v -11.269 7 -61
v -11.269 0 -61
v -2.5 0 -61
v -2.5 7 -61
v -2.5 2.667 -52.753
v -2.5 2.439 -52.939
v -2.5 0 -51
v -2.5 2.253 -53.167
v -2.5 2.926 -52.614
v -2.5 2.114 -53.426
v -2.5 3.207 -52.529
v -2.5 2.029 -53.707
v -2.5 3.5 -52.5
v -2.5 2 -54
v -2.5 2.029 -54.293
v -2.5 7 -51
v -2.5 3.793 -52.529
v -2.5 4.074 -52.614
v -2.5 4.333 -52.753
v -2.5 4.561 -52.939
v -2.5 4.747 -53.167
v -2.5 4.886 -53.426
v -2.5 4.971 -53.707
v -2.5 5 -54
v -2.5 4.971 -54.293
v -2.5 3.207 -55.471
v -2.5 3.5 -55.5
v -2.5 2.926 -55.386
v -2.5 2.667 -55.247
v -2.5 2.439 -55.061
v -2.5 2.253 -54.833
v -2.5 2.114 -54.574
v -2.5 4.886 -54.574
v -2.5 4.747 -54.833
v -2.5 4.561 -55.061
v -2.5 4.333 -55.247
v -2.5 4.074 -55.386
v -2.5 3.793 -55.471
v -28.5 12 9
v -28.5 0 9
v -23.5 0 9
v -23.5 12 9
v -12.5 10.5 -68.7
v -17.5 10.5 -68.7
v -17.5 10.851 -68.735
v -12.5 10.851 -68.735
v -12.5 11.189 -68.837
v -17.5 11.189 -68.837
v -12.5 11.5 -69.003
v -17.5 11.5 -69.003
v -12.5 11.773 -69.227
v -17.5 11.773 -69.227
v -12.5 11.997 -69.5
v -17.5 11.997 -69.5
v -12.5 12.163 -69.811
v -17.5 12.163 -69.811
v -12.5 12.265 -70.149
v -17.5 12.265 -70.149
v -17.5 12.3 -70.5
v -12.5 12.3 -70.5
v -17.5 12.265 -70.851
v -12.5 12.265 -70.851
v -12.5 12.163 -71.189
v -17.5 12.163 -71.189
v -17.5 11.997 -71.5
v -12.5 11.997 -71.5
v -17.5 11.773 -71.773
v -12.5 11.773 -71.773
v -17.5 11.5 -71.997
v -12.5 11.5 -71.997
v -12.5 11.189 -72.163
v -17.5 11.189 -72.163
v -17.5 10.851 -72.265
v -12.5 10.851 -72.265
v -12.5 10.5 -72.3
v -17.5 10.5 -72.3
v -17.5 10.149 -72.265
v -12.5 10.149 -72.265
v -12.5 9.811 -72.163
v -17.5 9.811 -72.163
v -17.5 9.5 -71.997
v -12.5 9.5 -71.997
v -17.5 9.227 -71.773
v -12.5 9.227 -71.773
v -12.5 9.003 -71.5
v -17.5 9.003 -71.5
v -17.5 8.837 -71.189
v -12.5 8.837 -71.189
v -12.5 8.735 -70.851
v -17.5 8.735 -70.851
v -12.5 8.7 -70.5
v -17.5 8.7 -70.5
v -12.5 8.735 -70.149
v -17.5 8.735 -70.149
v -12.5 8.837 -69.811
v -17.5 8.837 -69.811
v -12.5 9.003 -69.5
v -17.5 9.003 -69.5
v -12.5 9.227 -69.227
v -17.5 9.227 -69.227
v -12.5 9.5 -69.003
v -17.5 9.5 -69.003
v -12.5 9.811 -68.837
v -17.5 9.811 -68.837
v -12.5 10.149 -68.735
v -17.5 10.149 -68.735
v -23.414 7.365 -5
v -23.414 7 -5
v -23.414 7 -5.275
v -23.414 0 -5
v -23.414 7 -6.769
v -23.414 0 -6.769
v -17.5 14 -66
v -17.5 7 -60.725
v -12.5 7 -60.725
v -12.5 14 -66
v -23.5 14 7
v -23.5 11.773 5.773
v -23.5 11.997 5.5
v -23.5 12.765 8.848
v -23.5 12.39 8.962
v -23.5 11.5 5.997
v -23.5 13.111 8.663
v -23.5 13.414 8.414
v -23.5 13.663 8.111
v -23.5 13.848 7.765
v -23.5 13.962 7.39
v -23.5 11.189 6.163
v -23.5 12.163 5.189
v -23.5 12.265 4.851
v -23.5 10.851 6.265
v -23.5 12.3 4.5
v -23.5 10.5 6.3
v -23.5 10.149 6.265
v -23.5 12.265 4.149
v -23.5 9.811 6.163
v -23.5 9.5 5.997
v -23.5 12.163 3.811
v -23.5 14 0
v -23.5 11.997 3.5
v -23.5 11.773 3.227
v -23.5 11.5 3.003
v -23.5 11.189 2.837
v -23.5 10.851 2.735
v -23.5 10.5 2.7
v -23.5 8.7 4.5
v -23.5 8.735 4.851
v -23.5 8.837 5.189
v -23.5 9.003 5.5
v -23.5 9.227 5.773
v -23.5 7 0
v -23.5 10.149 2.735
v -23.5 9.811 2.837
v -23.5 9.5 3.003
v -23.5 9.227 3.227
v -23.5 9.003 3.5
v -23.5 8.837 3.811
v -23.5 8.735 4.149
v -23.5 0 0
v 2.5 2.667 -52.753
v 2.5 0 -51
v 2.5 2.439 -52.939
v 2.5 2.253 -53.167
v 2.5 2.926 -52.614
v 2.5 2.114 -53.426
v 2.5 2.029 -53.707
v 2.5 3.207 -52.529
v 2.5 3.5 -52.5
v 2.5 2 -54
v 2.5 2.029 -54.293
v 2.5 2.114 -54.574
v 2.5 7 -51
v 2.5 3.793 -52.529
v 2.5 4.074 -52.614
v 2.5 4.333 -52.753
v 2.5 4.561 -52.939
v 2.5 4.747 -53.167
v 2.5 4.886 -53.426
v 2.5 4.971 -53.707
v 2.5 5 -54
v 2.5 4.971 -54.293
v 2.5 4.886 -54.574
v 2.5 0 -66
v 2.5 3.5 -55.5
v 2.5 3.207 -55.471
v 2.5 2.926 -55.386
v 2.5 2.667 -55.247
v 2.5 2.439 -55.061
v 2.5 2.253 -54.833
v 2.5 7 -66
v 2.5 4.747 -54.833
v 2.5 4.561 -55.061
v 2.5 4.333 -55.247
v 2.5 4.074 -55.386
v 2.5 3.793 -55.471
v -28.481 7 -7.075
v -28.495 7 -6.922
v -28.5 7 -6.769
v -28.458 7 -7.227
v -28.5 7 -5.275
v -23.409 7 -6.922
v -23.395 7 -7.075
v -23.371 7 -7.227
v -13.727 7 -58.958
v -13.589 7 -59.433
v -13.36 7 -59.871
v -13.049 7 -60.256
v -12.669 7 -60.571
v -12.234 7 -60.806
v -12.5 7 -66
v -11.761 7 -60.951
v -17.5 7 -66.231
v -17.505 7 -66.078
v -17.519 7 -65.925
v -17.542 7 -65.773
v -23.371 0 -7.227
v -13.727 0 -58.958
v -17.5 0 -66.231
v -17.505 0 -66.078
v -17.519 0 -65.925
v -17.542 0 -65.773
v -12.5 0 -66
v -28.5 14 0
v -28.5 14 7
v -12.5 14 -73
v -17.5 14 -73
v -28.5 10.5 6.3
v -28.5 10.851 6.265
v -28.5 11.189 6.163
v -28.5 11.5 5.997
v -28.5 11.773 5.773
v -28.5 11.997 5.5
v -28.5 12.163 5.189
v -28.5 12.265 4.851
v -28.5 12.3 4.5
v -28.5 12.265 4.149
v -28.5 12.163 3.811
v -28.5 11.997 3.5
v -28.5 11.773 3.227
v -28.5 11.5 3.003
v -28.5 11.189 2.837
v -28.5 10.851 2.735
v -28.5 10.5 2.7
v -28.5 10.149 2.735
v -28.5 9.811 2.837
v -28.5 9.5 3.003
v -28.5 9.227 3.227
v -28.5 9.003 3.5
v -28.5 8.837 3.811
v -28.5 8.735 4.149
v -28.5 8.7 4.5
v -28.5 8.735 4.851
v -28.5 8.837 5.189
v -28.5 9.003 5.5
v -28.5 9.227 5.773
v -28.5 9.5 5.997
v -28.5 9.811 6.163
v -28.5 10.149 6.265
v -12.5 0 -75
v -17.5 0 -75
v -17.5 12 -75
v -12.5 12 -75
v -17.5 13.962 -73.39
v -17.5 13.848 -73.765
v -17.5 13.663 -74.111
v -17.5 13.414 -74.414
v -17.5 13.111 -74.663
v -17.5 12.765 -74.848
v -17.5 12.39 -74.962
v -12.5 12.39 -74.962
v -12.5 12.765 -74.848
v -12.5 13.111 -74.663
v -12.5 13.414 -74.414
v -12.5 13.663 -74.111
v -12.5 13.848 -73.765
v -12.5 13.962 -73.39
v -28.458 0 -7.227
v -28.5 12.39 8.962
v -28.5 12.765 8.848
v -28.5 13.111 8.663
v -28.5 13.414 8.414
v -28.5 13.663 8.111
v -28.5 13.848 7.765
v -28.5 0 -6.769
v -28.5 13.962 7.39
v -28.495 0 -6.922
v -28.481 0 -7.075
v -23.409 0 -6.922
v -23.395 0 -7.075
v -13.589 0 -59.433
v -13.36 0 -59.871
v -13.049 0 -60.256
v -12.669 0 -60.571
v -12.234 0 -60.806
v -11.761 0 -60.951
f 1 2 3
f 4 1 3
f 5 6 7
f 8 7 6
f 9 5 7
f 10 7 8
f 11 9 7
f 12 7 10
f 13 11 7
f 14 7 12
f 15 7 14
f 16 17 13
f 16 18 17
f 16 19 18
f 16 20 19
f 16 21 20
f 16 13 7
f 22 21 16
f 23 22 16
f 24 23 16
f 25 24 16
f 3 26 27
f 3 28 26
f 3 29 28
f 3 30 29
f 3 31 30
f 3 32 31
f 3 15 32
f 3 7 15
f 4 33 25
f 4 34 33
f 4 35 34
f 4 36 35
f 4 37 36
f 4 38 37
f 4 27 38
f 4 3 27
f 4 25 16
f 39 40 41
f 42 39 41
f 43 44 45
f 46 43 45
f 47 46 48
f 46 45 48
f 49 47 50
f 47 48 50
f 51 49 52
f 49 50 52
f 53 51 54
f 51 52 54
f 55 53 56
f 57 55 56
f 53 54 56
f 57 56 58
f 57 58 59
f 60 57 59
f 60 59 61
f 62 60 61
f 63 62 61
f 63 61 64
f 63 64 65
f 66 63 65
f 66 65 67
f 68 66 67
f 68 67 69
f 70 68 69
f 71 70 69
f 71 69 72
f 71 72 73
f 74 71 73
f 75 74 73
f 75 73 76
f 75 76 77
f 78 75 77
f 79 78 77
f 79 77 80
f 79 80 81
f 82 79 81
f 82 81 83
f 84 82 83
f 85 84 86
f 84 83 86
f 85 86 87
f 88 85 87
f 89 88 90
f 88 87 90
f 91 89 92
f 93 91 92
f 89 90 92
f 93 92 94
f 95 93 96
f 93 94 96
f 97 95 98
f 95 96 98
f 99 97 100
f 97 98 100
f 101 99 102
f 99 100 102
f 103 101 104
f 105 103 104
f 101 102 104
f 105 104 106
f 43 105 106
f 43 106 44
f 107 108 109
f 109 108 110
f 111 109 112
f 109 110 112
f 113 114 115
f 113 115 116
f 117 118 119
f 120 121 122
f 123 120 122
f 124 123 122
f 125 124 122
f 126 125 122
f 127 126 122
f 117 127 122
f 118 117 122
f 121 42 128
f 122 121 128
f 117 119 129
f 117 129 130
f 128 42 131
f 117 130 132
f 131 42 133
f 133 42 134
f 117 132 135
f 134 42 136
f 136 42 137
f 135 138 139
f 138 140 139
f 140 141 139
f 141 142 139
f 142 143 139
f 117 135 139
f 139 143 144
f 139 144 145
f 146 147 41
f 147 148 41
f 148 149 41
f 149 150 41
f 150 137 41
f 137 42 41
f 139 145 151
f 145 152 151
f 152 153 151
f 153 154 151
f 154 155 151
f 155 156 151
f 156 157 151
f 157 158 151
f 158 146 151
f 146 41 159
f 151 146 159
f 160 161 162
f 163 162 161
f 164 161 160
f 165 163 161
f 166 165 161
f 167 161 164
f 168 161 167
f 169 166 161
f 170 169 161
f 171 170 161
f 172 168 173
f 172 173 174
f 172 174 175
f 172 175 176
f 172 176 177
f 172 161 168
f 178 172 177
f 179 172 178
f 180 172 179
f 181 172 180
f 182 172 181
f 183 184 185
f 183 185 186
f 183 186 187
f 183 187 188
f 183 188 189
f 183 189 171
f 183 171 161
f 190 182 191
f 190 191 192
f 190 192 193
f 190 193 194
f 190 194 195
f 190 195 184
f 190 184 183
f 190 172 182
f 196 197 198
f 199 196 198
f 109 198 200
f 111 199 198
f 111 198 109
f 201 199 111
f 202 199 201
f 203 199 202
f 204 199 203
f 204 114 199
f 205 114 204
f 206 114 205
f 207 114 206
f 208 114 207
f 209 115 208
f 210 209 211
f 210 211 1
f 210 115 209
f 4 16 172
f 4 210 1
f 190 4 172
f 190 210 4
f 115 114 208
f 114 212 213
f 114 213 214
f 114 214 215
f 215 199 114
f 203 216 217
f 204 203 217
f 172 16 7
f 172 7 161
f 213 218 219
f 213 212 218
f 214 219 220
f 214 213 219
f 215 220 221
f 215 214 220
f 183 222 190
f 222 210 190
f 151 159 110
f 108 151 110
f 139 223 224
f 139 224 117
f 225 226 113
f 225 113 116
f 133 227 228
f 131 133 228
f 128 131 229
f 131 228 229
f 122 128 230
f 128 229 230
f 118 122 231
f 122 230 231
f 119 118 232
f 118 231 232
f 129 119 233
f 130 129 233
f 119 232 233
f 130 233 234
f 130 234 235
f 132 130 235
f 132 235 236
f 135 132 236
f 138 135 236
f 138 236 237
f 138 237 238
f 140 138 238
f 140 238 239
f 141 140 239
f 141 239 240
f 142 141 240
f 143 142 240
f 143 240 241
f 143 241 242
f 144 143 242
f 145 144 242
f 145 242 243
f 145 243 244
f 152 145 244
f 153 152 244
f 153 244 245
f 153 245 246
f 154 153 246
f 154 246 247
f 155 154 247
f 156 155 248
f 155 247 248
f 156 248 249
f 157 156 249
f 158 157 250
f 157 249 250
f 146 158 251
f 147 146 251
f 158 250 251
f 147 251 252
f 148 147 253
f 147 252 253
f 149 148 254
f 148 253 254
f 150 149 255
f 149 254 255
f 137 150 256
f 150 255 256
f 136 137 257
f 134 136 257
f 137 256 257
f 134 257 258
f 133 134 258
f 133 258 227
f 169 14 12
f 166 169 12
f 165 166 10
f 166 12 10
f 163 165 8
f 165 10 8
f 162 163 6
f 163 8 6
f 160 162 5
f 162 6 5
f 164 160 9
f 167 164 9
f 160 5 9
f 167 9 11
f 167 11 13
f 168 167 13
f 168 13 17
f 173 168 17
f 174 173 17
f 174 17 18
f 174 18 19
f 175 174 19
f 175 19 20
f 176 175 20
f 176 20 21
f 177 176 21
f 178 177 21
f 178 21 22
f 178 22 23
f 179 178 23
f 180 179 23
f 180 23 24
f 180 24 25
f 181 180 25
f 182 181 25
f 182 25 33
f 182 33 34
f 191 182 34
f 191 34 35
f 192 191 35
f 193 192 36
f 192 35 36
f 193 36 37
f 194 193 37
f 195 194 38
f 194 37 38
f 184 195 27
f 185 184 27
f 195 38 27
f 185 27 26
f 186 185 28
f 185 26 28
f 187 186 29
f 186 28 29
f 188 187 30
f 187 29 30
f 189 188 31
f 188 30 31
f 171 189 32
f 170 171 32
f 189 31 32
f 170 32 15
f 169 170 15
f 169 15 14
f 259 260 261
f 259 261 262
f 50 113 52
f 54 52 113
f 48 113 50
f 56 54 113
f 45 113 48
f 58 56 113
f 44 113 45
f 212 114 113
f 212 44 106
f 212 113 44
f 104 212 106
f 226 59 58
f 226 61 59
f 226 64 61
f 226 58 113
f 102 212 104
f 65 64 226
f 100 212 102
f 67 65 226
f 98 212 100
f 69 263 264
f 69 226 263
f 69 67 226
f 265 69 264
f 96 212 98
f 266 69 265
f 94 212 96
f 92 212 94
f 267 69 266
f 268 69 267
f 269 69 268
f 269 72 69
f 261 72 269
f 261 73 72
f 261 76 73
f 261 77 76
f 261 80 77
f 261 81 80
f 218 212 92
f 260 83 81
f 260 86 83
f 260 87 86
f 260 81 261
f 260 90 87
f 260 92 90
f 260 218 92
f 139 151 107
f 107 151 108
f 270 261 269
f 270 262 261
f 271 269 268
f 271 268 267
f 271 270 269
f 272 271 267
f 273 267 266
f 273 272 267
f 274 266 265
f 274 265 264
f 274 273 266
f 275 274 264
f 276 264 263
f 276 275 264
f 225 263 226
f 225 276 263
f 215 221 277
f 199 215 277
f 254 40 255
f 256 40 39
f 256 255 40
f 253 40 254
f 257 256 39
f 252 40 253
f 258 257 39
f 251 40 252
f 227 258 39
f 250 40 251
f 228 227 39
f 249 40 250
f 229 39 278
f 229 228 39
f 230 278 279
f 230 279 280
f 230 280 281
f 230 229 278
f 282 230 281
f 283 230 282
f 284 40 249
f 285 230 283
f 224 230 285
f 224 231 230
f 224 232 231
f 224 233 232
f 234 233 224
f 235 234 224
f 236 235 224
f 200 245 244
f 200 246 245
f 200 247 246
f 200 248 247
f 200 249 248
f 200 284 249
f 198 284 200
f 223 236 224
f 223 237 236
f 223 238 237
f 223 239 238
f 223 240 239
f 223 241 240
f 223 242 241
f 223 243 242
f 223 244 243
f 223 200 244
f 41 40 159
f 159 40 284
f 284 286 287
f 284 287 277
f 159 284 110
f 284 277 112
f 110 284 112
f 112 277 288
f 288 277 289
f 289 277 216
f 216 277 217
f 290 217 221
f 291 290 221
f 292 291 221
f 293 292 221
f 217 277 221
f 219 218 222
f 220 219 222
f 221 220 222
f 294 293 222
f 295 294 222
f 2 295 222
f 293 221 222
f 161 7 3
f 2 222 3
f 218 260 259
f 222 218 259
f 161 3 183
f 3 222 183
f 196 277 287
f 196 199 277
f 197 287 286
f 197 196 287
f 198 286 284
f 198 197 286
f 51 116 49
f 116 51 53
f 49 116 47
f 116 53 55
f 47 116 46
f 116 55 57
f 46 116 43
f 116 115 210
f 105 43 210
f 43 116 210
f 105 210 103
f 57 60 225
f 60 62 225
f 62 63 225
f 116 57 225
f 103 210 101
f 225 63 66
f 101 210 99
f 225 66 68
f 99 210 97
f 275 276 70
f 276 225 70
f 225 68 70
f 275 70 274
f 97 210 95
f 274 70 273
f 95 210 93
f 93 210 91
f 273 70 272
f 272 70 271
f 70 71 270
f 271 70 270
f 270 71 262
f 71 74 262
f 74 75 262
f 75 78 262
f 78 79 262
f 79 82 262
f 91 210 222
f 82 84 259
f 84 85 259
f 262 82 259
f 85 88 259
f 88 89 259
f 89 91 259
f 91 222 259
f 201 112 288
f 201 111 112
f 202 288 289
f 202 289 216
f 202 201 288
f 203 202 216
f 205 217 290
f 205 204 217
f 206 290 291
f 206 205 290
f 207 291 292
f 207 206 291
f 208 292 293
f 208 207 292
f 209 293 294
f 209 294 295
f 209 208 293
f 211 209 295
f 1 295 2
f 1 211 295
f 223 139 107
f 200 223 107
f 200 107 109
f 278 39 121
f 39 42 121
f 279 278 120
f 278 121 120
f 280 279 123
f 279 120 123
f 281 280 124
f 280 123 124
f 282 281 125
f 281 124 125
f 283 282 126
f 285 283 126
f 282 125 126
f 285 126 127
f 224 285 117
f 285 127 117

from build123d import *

# Parameters (mm, degrees)
BOSS_EXTRUDE1_DEPTH      = 7
BOSS_EXTRUDE2_START      = 7
SKETCH1_3_W              = 5
SKETCH1_3_H              = 9
BOSS_EXTRUDE2_DEPTH      = 7
M3_CLEARANCE_HOLE1_D     = 3.6
FILLET2_R                = 2.5
BOSS_EXTRUDE3_DEPTH      = 10
BOSS_EXTRUDE3_DEPTH_BACK = 5
SKETCH6_W                = 5
SKETCH6_H                = 7
SKETCH7_R                = 1.5
CUT_EXTRUDE1_DEPTH       = 10
FILLET6_R                = 2
SKETCH8_W                = 84
SKETCH8_H                = 14
CUT_EXTRUDE2_DEPTH       = 83.35289916
CHAMFER2_SIZE            = 7
CHAMFER2_SIZE_2          = 5.274878351


with BuildPart() as part:
    # Sketch1 → Boss-Extrude1 (new body)
    with BuildSketch(Plane(origin=(0, 0, 0), x_dir=(1, 0, 0), z_dir=(0, 1, 0))):
        Polygon((-23.5, -9), (-23.5, 0), (-23.413842004, 5), (-23.413842004, 7), (-13.346045394, 61), (13.346045394, 61), (23.413842004, 7), (23.413842004, 5), (23.5, 0), (23.5, -9), (28.5, -9), (28.5, 7), (17.5, 66), (17.5, 75), (12.5, 75), (12.5, 66), (-12.5, 66), (-12.5, 75), (-17.5, 75), (-17.5, 66), (-28.5, 7), (-28.5, -9), align=None)
    extrude(amount=BOSS_EXTRUDE1_DEPTH)

    # Sketch1<3> → Boss-Extrude2 (add)
    with BuildSketch(Plane(origin=(0, 0, 0), x_dir=(1, 0, 0), z_dir=(0, 1, 0)).offset(BOSS_EXTRUDE2_START)):
        with Locations((-15, 70.5)):
            Rectangle(SKETCH1_3_W, SKETCH1_3_H)
        with Locations((15, 70.5)):
            Rectangle(SKETCH1_3_W, SKETCH1_3_H)
        with Locations((-26, -4.5)):
            Rectangle(SKETCH1_3_W, SKETCH1_3_H)
        with Locations((26, -4.5)):
            Rectangle(SKETCH1_3_W, SKETCH1_3_H)
    extrude(amount=BOSS_EXTRUDE2_DEPTH)

    # M3 Clearance Hole1 (through all)
    with Locations(Plane(origin=(28.5, 0, 0), x_dir=(0, 0, -1), z_dir=(1, 0, 0))):
        with Locations((-4.5, 10.5), (70.5, 10.5)):
            Hole(M3_CLEARANCE_HOLE1_D / 2)

    # Fillet2
    fillet2_edges = [part.edges().sort_by_distance(p)[0] for p in [
        (-28.5, 3.5, -7),
        (-17.5, 3.5, -66),
        (17.5, 3.5, -66),
        (28.5, 3.5, -7),
        (23.413842004, 3.5, -5),
        (23.413842004, 3.5, -7),
        (13.346045394, 3.5, -61),
        (-13.346045394, 3.5, -61),
        (-23.413842004, 3.5, -7),
        (-23.413842004, 3.5, -5),
    ]]
    fillet(fillet2_edges, radius=FILLET2_R)

    # Sketch6 → Boss-Extrude3 (add, two sides: drawn at the far end of the back side and taken through both)
    with BuildSketch(Plane.XY.offset(-61).offset(-BOSS_EXTRUDE3_DEPTH_BACK)):
        with Locations((0, 3.5)):
            Rectangle(SKETCH6_W, SKETCH6_H)
    extrude(amount=BOSS_EXTRUDE3_DEPTH + BOSS_EXTRUDE3_DEPTH_BACK)

    # Sketch7 → Cut-Extrude1 (cut)
    with BuildSketch(Plane.ZY.offset(2.5)):
        with Locations(Location((-54, 3.5, 0), (0, 0, 270))):
            Circle(SKETCH7_R)
    extrude(amount=-CUT_EXTRUDE1_DEPTH, mode=Mode.SUBTRACT)

    # Fillet6
    fillet6_edges = [part.edges().sort_by_distance(p)[0] for p in [
        (26, 14, 9),
        (-15, 14, -75),
        (15, 14, -75),
        (-26, 14, 9),
    ]]
    fillet(fillet6_edges, radius=FILLET6_R)

    # Sketch8 → Cut-Extrude2 (cut, through all)
    with BuildSketch(Plane(origin=(2.5, 0, 0), x_dir=(0, 0, -1), z_dir=(1, 0, 0))):
        with Locations((33, 7)):
            Rectangle(SKETCH8_W, SKETCH8_H)
    extrude(amount=CUT_EXTRUDE2_DEPTH, mode=Mode.SUBTRACT)

    # Chamfer2
    # the kernel refuses this chamfer: 7, 5.274878351 mm, written as the material it adds along each edge
    with BuildSketch(Plane(origin=(-5.436042239, 7, 0), x_dir=(0, 0.9997280272590686, 0.023321052992758308), z_dir=(-1, 0, 0))) as chamfer2_piece_1_section:
        Polygon((CHAMFER2_SIZE * 0.999728027259, CHAMFER2_SIZE * 0.0233210529928), (-CHAMFER2_SIZE_2 * 0.0233210529915, CHAMFER2_SIZE_2 * 0.999728027206), (0, 0), align=None)
    chamfer2_piece_1 = extrude(amount=23.063957761, mode=Mode.PRIVATE)
    chamfer2_piece_1 = split(chamfer2_piece_1, bisect_by=Plane(origin=(-23.413842004, 8.750234769, -2.637085353), z_dir=(-1, 0, 0)), keep=Keep.TOP, mode=Mode.PRIVATE)
    chamfer2_piece_1 = split(chamfer2_piece_1, bisect_by=Plane(origin=(-23.454565548, 8.750234769, -2.636693852), z_dir=(-0.999851569048757, 0, -0.01722904149216463)), keep=Keep.TOP, mode=Mode.PRIVATE)
    add(chamfer2_piece_1)
    with BuildSketch(Plane(origin=(-17.5, 7, -66), x_dir=(2.839775720480132e-15, -0.0410460451010975, 0.9991572559820394), z_dir=(1, 0, 0))) as chamfer2_piece_2:
        Polygon((CHAMFER2_SIZE_2 * 0.999157255929, -CHAMFER2_SIZE_2 * 0.0410460450989), (-CHAMFER2_SIZE * 0.0410460451011, -CHAMFER2_SIZE * 0.999157255982), (0, 0), align=None)
    extrude(amount=5)


solid = part.part
